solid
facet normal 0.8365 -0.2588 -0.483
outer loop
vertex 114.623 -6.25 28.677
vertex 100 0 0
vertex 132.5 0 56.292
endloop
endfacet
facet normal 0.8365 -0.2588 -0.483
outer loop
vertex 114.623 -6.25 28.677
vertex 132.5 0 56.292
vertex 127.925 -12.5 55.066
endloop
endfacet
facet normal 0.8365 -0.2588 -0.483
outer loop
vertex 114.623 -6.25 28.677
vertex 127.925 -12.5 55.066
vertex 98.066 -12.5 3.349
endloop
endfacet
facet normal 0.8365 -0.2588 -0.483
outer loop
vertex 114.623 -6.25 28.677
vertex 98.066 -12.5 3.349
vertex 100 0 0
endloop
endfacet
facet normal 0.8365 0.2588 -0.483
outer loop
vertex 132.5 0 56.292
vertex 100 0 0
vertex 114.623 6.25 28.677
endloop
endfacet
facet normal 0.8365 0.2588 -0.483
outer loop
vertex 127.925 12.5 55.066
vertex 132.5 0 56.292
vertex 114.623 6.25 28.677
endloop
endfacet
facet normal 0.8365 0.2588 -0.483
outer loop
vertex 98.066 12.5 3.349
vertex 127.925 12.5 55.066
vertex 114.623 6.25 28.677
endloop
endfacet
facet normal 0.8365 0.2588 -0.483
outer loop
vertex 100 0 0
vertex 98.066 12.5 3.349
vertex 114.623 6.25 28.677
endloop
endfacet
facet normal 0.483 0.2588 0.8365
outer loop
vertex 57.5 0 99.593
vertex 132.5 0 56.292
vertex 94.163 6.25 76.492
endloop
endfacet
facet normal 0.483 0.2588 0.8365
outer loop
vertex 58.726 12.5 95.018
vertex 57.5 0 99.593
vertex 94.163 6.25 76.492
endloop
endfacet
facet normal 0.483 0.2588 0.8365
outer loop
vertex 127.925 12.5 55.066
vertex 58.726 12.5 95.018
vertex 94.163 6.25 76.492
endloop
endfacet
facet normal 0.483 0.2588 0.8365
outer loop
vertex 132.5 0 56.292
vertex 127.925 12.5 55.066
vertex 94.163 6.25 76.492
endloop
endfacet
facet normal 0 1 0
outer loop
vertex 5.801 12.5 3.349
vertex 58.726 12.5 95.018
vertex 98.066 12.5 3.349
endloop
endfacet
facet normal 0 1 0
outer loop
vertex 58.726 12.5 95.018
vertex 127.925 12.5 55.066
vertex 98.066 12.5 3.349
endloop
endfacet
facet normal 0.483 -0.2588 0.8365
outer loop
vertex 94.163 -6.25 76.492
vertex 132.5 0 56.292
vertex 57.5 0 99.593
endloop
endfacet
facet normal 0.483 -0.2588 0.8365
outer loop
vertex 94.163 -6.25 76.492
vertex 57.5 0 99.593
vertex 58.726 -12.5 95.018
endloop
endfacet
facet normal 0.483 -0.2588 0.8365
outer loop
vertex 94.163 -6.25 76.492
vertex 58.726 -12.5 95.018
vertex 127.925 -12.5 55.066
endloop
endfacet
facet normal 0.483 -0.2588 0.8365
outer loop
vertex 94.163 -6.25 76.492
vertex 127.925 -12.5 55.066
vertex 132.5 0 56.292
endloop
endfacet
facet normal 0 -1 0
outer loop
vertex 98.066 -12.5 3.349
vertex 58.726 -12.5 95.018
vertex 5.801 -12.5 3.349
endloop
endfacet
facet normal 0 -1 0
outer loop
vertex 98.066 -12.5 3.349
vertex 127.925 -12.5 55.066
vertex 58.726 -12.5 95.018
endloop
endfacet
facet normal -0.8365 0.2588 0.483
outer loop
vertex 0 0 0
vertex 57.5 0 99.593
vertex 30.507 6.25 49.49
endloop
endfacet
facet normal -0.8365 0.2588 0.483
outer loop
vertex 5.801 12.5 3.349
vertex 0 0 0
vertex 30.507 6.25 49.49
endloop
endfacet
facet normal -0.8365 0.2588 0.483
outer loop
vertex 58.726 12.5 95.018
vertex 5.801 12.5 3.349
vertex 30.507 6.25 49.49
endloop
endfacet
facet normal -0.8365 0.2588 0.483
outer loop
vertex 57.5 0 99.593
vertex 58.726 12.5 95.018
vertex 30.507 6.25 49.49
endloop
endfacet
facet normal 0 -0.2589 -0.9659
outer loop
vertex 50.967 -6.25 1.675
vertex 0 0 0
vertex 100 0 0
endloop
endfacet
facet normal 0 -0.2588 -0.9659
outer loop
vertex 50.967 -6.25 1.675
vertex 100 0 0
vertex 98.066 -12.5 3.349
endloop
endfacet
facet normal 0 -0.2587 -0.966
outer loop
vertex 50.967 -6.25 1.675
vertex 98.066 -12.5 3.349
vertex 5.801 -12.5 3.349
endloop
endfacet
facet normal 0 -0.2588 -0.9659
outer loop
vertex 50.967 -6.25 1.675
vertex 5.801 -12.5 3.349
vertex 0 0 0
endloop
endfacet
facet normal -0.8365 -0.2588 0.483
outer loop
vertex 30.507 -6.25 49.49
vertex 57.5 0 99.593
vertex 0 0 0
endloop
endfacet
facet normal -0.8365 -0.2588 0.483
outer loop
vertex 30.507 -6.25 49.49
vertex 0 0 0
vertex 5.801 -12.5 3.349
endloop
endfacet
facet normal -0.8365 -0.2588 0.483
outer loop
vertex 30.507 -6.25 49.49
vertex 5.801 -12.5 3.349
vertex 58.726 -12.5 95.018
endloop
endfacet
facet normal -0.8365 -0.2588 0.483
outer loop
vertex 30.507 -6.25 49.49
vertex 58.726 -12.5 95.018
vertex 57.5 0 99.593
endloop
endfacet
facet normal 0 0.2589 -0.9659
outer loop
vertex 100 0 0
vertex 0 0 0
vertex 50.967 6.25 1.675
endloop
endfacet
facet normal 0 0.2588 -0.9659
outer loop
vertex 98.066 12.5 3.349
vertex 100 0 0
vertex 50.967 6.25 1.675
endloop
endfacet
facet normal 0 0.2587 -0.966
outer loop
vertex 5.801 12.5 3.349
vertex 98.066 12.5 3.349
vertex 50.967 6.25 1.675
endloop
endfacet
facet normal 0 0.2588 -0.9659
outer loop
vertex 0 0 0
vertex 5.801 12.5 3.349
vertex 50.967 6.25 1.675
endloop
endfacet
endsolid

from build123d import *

# Parameters (mm, degrees)
F1_DEPTH = 12.5
F1_TAPER = 15


with BuildPart() as f1:
    # F0 (on Front) → F1 (new body, symmetric)
    with BuildSketch(Plane.XZ):
        Polygon((57.5, 99.5929214352), (0, 0), (100, 0), (132.5, 56.291651246), align=None)
    extrude(amount=F1_DEPTH, both=True, taper=F1_TAPER)


solid = f1.part
